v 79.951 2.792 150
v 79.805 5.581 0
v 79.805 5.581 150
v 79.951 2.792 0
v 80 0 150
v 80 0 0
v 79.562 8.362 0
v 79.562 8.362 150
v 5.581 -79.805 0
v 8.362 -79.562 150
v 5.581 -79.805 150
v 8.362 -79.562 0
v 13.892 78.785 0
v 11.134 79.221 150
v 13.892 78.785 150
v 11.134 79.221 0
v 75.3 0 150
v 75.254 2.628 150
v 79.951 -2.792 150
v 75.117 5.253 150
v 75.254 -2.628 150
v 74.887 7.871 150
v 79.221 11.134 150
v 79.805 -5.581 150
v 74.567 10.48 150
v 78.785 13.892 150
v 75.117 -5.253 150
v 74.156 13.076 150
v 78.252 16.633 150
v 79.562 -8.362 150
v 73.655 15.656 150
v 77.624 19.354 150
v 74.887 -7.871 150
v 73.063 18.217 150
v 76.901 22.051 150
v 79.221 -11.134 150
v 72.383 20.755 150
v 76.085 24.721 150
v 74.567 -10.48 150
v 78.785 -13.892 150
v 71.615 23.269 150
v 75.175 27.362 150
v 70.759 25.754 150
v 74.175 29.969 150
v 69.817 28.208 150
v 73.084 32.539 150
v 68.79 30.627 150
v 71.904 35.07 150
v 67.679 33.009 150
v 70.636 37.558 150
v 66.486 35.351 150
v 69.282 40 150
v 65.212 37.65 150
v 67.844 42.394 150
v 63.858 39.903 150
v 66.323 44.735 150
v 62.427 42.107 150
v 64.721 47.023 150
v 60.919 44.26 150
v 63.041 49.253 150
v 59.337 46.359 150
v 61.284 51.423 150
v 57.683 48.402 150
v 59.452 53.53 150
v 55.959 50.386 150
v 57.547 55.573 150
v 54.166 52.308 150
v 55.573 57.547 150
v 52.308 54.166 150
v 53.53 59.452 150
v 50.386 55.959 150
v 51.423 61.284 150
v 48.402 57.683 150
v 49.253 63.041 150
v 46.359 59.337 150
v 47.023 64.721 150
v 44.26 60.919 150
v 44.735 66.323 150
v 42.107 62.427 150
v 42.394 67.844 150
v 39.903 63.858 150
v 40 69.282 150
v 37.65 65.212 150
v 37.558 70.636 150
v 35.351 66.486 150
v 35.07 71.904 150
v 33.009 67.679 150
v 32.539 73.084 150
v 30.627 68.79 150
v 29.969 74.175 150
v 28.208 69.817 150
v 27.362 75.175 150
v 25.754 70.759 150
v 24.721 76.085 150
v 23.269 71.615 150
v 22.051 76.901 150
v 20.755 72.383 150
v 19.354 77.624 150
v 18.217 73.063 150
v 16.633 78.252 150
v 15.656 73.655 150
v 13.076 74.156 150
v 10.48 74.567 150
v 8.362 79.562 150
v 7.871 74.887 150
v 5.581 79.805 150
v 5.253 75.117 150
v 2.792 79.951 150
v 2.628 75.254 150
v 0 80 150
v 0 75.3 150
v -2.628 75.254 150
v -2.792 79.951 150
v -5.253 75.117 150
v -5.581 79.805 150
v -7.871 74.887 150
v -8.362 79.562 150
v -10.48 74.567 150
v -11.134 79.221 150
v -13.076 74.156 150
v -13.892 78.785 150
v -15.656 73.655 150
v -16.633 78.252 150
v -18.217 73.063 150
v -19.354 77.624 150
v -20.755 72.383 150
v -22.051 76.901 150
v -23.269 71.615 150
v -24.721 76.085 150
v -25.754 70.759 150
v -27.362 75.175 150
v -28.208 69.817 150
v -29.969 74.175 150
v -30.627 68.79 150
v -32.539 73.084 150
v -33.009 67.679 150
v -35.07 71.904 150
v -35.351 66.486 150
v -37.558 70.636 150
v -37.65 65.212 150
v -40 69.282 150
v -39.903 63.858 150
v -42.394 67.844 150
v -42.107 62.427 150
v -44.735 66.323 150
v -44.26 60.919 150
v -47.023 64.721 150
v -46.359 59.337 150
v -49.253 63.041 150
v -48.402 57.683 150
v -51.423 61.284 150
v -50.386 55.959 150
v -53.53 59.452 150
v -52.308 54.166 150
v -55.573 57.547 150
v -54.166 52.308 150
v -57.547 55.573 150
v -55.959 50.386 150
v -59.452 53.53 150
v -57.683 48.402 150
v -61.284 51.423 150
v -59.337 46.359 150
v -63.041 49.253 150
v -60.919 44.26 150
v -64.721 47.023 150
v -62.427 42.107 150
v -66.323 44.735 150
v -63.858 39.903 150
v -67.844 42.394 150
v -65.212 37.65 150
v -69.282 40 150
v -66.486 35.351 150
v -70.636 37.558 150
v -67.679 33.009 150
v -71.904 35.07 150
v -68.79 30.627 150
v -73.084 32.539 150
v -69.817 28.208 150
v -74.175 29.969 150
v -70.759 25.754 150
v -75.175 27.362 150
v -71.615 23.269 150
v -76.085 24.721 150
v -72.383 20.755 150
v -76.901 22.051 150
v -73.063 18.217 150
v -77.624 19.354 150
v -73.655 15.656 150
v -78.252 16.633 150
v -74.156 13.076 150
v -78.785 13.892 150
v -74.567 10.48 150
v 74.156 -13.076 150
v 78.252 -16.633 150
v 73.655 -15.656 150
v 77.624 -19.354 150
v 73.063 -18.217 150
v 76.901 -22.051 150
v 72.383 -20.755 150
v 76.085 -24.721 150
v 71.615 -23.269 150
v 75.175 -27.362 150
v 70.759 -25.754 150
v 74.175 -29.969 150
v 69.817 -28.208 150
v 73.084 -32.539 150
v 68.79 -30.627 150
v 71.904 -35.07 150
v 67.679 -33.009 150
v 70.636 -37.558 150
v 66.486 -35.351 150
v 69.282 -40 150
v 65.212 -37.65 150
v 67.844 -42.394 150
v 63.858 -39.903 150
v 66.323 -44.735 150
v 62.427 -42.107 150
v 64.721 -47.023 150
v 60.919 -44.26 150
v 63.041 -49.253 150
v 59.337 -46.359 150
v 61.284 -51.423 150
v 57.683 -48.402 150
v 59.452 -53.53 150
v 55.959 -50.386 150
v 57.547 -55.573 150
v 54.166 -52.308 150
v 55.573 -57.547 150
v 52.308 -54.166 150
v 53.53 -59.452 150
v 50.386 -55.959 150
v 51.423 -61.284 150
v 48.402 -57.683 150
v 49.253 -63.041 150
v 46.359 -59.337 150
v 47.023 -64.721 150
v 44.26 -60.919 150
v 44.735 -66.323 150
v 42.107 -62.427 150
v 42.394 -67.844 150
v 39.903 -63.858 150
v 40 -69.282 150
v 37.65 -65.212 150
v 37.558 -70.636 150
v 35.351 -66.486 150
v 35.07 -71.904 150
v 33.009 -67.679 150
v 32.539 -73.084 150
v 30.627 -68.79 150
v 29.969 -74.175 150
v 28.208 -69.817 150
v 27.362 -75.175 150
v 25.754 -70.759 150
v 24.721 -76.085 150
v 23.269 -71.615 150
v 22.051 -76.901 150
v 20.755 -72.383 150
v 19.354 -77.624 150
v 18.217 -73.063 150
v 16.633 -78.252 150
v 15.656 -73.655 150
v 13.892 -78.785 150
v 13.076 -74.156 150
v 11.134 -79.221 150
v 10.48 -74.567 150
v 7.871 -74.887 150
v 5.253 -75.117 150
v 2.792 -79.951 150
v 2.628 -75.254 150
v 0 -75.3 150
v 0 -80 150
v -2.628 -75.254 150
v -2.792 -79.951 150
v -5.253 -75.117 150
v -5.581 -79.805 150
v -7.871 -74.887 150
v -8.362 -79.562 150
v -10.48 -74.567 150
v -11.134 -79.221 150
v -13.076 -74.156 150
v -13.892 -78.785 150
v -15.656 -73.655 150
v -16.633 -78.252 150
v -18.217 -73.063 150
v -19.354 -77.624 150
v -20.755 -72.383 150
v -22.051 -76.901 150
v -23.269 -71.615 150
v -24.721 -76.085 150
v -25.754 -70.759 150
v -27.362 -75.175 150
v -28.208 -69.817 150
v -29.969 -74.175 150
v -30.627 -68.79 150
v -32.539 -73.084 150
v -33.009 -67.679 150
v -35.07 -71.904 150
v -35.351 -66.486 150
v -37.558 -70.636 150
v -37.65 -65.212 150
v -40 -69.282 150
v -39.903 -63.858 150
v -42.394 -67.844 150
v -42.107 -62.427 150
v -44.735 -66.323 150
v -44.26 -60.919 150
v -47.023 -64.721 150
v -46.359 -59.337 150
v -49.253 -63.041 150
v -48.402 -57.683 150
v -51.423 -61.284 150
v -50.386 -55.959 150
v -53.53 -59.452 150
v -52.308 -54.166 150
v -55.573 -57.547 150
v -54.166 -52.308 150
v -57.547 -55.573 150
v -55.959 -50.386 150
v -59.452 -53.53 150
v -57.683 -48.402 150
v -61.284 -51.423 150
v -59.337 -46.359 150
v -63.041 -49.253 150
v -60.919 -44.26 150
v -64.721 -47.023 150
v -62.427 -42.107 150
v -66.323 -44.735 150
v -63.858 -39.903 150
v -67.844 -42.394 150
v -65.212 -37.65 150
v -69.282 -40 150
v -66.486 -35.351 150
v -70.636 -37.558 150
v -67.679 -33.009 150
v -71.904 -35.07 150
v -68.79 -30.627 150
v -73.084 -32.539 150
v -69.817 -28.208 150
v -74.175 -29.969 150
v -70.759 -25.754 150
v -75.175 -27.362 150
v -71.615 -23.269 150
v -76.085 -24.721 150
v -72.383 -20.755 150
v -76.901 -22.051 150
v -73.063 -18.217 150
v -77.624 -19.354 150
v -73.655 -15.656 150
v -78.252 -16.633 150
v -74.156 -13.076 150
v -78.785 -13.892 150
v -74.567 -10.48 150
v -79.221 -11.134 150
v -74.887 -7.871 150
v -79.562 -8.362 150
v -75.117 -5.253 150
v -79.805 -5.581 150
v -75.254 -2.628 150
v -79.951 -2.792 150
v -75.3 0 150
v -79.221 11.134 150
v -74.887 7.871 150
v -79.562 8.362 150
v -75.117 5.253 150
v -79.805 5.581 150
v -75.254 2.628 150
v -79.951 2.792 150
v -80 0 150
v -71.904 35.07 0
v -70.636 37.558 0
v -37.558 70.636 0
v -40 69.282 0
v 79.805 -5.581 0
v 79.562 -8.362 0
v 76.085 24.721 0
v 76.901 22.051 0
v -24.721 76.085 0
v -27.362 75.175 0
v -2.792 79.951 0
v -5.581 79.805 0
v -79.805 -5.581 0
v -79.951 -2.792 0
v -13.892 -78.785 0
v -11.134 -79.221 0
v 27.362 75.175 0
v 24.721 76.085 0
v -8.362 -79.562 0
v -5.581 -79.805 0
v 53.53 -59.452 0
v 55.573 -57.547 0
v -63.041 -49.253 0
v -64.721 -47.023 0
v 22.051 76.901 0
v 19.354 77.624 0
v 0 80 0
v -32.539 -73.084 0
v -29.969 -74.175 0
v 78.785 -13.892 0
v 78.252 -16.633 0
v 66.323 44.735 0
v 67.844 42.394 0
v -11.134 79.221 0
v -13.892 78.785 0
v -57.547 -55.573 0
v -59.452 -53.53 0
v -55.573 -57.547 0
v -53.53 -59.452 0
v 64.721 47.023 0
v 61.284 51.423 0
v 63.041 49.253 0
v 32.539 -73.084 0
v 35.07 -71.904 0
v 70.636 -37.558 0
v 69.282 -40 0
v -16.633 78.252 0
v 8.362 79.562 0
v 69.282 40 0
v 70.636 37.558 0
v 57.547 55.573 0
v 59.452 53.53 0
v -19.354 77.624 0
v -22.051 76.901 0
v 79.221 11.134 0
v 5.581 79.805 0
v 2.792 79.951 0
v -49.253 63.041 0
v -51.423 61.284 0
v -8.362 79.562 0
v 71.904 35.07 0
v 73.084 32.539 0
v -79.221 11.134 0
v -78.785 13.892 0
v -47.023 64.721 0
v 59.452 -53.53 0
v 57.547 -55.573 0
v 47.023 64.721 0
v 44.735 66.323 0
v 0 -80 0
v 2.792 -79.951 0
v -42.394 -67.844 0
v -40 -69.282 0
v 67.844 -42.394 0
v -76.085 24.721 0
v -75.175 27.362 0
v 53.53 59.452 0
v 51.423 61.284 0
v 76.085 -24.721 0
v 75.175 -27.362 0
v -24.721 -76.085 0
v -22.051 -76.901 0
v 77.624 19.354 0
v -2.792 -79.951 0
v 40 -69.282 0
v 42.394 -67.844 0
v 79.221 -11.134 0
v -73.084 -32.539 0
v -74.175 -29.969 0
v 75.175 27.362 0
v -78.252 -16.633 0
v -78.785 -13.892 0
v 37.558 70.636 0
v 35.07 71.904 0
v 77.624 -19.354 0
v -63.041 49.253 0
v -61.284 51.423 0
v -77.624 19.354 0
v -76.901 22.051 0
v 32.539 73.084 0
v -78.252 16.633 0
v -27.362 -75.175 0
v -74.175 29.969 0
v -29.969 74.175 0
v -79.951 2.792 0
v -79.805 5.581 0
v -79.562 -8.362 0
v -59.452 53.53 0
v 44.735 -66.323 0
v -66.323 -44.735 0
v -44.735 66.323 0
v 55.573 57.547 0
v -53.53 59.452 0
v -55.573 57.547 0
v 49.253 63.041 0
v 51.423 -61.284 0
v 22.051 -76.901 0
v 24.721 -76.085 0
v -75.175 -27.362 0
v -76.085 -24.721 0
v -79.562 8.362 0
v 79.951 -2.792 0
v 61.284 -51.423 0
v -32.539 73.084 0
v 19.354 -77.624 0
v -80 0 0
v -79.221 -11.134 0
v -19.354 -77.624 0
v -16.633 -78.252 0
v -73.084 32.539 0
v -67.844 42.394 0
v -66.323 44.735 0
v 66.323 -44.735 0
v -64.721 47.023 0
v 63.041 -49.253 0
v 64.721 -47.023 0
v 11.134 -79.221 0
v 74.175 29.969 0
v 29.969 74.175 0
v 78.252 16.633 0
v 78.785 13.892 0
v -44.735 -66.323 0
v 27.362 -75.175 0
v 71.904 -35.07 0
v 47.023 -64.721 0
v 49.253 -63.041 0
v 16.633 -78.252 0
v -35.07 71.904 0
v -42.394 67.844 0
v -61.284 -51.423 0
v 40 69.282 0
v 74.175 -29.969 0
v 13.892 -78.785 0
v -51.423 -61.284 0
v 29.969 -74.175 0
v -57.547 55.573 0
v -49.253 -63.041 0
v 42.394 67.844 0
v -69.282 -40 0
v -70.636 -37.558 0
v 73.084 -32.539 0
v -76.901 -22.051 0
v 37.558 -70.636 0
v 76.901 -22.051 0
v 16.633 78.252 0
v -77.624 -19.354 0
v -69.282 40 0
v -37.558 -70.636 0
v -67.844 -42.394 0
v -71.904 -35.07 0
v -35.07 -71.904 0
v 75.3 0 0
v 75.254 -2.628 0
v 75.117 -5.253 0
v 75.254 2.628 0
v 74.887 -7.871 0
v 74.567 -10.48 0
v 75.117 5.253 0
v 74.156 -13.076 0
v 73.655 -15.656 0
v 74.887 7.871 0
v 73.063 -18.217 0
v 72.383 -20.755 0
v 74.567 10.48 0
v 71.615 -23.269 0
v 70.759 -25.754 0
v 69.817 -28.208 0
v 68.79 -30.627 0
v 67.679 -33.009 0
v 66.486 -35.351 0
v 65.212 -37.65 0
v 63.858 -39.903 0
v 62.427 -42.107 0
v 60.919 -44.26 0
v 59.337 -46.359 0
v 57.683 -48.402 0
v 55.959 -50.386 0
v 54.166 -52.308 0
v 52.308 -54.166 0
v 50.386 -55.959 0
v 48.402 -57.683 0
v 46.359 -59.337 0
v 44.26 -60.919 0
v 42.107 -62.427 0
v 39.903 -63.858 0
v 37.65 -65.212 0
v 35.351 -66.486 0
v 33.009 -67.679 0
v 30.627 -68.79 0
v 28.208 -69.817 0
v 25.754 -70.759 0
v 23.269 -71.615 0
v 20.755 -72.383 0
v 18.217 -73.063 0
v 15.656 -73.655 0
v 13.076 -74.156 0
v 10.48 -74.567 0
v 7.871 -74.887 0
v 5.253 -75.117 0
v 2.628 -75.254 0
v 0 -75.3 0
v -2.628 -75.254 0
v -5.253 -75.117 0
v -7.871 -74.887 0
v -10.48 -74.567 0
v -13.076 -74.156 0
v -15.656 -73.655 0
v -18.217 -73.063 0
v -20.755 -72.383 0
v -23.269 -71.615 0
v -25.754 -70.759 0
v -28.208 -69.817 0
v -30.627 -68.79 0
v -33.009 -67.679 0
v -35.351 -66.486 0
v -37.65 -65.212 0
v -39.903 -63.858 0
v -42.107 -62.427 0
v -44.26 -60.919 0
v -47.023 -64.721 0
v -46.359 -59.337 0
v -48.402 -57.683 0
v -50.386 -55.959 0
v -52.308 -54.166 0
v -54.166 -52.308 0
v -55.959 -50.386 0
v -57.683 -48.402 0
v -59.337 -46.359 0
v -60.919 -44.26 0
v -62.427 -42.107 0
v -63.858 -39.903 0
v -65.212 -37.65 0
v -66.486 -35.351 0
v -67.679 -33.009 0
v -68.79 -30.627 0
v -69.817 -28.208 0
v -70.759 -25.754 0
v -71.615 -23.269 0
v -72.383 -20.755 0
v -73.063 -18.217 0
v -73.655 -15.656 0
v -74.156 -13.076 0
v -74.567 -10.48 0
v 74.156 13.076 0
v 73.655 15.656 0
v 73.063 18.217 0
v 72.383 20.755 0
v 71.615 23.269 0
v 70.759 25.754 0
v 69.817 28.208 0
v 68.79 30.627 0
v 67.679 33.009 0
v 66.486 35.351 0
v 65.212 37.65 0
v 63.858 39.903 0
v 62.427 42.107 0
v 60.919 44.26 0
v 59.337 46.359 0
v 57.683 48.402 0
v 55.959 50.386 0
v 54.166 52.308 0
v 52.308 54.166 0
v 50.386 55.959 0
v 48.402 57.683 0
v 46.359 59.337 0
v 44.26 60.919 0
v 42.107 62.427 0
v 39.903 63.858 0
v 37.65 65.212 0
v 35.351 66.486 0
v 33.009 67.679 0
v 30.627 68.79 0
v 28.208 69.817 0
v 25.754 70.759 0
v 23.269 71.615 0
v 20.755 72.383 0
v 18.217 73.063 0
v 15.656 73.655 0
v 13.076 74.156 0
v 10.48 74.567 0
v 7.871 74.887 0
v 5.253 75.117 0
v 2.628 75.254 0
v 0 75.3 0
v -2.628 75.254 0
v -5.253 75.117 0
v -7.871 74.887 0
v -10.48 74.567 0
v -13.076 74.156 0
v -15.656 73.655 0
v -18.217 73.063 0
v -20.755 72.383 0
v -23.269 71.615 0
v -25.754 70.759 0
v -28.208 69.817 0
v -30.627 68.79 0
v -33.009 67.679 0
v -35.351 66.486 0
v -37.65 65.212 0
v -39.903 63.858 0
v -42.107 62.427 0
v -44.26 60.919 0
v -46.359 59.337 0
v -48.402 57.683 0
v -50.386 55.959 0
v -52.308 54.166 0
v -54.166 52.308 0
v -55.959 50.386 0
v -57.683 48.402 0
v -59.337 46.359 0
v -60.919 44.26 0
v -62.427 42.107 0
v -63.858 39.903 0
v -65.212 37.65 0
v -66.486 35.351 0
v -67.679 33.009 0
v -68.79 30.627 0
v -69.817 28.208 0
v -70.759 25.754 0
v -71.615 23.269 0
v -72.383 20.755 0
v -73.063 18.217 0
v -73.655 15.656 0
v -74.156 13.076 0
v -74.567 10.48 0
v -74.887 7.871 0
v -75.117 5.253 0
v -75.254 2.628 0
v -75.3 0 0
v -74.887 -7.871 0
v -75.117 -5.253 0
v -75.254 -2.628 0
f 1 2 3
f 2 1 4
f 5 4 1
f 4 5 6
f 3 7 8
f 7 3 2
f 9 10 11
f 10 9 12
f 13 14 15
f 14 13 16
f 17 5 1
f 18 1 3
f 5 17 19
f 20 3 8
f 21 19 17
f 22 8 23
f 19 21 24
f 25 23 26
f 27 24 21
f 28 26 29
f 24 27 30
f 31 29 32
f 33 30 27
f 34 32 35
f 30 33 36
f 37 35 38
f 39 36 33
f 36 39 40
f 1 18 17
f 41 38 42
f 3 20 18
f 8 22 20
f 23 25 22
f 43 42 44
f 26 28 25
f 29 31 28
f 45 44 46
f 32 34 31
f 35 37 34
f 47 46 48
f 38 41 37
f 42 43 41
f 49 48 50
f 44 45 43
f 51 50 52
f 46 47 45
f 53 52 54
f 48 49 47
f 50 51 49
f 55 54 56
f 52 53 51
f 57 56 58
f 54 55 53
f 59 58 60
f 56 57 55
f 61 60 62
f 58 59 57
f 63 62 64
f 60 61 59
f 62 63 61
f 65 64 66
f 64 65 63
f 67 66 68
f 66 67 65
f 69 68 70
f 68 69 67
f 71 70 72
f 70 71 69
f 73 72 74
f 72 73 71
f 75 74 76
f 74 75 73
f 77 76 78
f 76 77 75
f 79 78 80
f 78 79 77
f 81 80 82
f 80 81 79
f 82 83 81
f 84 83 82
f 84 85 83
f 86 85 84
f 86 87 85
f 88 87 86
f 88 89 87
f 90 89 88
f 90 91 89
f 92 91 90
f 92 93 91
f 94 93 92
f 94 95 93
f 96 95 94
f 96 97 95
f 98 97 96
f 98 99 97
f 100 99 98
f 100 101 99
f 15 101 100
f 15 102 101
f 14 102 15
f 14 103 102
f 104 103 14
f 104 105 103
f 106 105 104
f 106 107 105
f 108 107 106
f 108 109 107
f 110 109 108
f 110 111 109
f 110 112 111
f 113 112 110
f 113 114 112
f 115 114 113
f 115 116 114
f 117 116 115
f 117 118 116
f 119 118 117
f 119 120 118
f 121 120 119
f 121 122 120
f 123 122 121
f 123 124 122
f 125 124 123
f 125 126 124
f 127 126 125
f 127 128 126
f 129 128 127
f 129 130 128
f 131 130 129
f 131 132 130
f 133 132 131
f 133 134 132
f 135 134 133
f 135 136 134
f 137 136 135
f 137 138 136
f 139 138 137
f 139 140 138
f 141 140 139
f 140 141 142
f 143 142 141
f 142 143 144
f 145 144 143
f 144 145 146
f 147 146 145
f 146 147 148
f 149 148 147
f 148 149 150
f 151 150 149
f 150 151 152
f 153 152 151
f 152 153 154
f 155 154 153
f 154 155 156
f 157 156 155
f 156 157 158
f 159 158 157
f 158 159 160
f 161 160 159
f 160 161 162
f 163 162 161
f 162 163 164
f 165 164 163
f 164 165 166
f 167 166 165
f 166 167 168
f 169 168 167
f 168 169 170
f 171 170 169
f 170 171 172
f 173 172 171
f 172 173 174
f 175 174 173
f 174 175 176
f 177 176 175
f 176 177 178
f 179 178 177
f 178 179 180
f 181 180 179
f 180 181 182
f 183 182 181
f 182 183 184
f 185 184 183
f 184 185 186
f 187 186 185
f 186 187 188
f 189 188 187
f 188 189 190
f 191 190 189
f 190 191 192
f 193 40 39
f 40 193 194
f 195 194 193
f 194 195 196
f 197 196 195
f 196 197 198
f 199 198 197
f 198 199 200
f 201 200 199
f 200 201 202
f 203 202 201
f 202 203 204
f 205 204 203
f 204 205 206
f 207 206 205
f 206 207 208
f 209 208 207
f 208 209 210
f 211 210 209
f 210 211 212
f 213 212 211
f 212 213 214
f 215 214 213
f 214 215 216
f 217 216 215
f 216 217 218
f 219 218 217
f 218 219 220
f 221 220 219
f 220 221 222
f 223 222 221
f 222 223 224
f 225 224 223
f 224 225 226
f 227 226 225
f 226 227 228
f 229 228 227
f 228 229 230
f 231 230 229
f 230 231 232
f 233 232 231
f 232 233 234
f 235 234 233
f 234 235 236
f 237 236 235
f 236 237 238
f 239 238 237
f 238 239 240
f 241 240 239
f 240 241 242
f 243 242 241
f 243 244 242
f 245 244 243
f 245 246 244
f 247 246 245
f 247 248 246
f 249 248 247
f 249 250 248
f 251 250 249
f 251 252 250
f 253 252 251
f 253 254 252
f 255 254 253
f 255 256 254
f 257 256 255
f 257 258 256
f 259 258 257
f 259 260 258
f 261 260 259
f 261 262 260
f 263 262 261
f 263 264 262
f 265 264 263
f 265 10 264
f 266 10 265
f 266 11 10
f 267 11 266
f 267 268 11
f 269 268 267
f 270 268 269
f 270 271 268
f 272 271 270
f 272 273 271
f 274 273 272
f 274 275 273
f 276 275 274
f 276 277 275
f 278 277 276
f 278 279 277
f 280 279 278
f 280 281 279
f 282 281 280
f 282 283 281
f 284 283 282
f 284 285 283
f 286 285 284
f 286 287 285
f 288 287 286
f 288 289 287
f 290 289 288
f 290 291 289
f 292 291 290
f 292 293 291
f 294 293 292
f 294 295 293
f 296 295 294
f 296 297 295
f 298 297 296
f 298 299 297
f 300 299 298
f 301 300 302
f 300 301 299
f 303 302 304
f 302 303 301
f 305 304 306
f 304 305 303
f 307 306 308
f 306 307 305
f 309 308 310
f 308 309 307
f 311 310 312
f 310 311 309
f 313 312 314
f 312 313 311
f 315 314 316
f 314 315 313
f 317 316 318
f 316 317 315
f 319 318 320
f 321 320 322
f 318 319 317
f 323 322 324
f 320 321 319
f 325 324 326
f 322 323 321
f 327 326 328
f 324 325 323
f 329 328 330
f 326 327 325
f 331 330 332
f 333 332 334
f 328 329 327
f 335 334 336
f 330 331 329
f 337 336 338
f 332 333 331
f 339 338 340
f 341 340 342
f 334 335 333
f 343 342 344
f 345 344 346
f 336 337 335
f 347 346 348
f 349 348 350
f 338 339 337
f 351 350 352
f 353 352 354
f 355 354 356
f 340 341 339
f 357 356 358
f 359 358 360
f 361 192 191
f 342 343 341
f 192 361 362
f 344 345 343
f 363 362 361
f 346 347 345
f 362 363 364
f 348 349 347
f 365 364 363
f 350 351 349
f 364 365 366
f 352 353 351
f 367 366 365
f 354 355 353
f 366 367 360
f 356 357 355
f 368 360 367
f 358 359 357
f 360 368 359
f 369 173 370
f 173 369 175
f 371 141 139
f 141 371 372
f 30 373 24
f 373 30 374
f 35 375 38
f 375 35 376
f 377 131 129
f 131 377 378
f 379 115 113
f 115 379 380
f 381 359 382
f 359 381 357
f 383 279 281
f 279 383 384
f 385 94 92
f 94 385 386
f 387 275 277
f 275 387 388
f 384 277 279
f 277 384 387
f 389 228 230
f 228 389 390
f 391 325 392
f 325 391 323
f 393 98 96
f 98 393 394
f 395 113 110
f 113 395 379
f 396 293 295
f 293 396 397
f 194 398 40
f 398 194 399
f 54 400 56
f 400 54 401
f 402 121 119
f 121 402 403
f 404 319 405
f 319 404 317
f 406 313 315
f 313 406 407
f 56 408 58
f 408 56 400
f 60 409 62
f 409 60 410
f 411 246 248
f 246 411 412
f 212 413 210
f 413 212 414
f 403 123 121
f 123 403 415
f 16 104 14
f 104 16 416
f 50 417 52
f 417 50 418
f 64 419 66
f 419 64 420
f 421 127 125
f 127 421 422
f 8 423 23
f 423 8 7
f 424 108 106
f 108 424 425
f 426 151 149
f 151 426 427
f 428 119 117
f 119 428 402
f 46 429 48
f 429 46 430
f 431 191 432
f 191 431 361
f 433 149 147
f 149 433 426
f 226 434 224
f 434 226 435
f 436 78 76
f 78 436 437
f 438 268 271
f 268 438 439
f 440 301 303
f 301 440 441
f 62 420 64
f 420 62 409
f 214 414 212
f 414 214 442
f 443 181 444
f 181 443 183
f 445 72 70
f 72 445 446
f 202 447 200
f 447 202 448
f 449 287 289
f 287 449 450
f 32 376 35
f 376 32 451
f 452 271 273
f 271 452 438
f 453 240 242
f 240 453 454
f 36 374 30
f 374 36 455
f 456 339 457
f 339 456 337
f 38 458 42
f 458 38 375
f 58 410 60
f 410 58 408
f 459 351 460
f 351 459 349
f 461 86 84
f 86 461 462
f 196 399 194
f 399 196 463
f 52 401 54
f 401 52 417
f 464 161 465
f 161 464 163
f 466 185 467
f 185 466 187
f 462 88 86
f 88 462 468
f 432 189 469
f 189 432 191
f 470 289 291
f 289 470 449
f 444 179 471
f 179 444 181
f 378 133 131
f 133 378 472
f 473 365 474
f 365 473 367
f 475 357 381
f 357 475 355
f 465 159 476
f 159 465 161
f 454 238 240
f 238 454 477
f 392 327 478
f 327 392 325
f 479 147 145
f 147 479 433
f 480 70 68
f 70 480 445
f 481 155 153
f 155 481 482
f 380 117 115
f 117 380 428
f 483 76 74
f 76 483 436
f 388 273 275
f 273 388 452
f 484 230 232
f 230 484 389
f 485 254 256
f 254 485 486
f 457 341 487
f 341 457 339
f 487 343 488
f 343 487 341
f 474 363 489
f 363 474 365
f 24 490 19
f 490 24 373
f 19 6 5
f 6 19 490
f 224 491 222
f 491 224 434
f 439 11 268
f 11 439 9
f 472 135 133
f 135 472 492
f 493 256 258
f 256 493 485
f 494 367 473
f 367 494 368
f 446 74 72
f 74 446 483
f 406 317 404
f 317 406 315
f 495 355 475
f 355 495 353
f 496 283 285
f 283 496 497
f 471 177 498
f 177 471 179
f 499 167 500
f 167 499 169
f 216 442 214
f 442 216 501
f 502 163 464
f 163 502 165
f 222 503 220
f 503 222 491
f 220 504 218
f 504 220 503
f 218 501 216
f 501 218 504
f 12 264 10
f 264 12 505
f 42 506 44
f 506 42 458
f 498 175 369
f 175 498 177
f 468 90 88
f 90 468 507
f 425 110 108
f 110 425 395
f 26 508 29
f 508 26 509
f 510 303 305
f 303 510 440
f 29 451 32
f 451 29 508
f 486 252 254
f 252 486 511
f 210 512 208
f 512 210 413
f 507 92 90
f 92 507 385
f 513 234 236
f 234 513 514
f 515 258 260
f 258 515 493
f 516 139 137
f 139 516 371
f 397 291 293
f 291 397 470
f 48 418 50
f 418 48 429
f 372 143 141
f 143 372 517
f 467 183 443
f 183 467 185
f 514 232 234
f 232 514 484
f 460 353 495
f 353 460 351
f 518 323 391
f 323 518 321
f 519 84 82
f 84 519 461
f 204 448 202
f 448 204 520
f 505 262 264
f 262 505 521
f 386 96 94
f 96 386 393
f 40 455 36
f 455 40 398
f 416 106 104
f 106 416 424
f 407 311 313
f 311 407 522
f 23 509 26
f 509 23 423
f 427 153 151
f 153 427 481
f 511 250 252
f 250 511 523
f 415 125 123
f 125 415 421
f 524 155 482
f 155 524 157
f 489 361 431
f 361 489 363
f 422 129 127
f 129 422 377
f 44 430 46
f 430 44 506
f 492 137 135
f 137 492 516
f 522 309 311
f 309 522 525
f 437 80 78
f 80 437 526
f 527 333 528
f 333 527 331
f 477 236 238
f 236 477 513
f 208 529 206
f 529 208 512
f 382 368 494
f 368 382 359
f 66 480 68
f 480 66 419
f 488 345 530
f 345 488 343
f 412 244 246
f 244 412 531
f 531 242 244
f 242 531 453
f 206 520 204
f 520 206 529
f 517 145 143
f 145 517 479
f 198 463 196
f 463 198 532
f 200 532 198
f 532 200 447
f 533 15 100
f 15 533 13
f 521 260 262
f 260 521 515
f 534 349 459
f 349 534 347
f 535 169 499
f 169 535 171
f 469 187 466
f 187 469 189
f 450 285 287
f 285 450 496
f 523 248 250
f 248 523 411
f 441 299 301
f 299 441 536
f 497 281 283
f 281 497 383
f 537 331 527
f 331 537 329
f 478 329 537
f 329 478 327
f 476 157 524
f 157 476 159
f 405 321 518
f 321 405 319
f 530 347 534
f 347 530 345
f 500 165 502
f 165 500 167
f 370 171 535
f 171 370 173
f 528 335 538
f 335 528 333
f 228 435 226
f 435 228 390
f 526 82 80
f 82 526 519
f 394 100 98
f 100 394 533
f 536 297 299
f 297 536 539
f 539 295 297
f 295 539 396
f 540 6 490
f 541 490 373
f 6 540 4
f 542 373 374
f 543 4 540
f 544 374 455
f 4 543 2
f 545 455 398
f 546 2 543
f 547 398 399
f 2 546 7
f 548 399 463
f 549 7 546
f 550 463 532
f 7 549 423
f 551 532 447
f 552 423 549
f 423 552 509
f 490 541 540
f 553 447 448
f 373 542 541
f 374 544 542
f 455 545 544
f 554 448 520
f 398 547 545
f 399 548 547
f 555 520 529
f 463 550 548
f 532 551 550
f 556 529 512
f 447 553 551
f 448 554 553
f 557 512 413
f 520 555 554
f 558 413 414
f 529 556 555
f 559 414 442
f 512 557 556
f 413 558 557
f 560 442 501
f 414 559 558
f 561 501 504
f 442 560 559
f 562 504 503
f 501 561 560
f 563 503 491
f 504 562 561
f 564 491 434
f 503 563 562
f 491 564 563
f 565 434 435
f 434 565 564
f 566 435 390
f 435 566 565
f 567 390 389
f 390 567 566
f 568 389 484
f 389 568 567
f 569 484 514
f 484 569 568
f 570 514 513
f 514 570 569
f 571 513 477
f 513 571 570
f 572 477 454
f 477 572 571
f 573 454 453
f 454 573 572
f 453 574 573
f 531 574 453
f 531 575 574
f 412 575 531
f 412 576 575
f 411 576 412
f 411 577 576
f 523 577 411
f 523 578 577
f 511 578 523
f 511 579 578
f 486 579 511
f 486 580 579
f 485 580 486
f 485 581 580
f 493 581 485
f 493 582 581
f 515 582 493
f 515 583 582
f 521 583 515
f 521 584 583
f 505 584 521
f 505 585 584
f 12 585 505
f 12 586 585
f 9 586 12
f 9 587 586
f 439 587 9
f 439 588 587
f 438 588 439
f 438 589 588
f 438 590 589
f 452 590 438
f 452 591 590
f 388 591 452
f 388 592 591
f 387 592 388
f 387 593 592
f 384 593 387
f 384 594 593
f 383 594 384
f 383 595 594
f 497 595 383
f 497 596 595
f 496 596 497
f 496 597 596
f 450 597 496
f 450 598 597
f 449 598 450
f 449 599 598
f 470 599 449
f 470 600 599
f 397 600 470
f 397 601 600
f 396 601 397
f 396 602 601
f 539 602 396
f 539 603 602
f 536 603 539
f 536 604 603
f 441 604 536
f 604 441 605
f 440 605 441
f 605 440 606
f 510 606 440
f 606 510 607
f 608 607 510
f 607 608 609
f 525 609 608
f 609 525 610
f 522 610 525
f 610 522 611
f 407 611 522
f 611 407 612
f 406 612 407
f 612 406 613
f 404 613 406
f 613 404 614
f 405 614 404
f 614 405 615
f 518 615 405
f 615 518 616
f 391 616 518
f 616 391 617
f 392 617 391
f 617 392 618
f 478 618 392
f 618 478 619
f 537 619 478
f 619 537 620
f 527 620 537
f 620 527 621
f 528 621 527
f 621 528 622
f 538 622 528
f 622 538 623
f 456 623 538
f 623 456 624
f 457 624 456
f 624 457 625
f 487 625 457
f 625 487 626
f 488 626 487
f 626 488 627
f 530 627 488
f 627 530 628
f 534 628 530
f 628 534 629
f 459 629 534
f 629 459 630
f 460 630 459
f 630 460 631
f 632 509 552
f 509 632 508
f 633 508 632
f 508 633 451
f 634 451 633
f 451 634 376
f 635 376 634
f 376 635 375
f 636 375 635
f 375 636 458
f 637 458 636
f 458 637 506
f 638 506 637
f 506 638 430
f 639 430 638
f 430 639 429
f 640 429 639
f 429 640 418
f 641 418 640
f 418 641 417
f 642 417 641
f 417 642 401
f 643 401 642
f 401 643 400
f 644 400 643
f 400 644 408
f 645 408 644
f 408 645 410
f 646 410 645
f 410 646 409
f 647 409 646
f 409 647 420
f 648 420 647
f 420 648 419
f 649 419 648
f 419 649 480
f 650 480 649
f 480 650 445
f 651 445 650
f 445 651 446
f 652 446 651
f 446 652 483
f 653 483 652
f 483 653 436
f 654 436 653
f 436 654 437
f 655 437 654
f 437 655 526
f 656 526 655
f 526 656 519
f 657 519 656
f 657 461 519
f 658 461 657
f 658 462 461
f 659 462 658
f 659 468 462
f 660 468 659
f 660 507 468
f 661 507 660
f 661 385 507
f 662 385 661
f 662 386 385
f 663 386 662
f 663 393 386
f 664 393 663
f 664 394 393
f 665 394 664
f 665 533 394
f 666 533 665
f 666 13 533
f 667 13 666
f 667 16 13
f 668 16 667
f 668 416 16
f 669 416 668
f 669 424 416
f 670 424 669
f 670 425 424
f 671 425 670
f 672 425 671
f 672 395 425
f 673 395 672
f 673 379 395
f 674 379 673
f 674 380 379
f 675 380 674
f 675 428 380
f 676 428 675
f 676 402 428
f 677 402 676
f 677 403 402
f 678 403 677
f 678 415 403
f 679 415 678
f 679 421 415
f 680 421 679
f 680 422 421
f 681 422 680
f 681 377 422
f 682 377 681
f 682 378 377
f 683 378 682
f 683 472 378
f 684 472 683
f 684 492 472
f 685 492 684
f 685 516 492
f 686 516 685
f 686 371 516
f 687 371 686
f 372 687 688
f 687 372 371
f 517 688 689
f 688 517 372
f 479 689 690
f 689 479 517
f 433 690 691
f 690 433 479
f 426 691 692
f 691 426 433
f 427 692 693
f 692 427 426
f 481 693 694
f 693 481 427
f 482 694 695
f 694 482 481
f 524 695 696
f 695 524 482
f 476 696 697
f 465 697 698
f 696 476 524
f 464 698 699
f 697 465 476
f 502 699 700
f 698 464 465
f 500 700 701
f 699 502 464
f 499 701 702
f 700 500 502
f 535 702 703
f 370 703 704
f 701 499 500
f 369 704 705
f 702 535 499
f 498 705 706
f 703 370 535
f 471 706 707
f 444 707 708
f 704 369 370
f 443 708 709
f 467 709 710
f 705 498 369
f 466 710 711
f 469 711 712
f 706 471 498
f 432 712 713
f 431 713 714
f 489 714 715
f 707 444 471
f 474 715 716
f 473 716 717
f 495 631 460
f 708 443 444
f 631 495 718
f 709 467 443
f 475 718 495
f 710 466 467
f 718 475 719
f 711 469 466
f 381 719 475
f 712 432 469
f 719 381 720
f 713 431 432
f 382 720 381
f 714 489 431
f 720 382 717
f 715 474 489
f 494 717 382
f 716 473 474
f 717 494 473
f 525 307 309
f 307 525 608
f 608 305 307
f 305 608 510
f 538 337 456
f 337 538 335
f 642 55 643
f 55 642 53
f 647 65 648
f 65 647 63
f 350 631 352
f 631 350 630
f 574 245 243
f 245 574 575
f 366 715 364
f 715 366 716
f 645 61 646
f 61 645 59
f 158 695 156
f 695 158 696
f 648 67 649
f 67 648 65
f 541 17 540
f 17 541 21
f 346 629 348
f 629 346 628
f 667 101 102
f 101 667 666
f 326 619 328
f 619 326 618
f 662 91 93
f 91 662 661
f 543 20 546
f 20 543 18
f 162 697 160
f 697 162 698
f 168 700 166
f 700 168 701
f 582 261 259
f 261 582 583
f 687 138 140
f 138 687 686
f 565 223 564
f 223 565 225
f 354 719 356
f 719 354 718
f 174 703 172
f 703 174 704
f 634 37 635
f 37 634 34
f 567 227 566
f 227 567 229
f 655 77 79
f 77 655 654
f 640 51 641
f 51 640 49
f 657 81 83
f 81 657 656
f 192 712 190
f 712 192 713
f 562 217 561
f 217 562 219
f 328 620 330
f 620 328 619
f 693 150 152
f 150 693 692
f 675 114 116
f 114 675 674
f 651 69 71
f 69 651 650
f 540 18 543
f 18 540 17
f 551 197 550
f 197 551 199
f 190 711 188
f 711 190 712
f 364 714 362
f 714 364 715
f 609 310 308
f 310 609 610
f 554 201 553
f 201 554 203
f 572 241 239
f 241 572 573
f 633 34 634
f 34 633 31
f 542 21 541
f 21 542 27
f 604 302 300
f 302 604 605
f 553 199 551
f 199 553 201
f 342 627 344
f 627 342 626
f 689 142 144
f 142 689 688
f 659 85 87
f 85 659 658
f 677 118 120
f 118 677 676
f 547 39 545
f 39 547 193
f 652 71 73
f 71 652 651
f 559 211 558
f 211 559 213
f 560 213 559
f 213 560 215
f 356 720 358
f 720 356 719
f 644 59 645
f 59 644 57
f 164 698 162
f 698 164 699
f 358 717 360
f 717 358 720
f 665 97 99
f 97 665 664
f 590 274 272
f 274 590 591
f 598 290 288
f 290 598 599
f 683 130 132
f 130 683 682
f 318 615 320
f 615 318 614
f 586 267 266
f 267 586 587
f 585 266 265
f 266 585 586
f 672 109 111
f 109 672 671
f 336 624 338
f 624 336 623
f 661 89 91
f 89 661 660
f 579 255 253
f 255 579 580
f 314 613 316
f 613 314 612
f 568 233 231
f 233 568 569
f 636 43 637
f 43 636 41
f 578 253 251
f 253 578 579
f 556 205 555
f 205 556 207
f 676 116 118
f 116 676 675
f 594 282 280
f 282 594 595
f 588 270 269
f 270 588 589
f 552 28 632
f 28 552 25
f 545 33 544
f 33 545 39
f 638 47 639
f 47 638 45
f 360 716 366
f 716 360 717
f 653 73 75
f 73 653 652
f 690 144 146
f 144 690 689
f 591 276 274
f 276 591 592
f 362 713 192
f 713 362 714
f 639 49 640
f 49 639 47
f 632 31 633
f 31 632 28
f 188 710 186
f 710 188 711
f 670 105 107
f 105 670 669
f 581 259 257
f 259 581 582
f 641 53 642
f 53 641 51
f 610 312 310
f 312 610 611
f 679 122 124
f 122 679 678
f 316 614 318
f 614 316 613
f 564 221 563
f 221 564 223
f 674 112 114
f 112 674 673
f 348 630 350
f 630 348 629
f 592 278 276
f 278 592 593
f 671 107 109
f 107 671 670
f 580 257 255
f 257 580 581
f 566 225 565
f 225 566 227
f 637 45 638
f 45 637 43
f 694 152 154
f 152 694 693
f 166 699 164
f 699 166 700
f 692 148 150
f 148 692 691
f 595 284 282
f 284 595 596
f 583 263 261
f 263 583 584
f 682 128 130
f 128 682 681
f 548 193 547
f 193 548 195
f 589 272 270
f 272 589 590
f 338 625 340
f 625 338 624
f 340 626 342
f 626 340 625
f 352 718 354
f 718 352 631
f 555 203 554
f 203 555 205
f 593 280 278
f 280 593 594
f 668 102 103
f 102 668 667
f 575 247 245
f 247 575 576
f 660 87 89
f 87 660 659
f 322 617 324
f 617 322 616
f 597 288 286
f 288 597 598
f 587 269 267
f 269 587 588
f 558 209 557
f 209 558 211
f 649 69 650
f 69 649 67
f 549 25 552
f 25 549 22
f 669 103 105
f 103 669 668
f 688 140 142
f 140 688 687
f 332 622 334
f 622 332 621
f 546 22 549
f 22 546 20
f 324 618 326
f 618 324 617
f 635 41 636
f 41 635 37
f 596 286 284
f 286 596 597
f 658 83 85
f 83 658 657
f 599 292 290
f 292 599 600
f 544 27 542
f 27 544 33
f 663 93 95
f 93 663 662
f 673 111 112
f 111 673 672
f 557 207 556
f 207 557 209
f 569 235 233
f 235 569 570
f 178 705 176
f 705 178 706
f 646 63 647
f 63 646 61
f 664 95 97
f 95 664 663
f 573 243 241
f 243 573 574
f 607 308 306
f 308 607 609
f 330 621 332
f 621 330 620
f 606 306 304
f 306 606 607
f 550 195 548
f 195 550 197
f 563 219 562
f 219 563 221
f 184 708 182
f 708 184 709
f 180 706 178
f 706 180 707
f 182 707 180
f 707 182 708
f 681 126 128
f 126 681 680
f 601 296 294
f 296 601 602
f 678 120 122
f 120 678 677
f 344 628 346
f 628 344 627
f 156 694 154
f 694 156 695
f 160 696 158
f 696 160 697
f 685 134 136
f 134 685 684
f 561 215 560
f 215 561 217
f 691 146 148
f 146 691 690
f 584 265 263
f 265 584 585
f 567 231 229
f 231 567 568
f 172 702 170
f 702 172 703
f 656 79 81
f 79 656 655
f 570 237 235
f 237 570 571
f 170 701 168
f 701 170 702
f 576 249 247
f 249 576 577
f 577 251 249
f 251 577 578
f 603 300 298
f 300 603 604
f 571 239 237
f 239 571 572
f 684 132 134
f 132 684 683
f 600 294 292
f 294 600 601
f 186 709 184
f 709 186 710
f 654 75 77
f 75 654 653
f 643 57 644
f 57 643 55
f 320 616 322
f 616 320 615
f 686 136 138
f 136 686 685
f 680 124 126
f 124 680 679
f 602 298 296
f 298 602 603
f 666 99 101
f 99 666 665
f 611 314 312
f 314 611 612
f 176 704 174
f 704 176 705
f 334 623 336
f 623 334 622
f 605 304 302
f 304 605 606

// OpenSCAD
$fn = 180;

// HT pipe (approximation)
// "HT 160" interpreted as nominal OD 160 mm
// "150 mm" interpreted as pipe length

od = 160;          // outer diameter (mm)
wall = 4.7;        // typical HT wall thickness (mm), adjustable
len = 150;         // length (mm)

id = od - 2*wall;

module ht_pipe(od, id, len) {
    difference() {
        cylinder(h = len, d = od);
        translate([0,0,-0.1]) cylinder(h = len + 0.2, d = id);
    }
}

ht_pipe(od, id, len);
